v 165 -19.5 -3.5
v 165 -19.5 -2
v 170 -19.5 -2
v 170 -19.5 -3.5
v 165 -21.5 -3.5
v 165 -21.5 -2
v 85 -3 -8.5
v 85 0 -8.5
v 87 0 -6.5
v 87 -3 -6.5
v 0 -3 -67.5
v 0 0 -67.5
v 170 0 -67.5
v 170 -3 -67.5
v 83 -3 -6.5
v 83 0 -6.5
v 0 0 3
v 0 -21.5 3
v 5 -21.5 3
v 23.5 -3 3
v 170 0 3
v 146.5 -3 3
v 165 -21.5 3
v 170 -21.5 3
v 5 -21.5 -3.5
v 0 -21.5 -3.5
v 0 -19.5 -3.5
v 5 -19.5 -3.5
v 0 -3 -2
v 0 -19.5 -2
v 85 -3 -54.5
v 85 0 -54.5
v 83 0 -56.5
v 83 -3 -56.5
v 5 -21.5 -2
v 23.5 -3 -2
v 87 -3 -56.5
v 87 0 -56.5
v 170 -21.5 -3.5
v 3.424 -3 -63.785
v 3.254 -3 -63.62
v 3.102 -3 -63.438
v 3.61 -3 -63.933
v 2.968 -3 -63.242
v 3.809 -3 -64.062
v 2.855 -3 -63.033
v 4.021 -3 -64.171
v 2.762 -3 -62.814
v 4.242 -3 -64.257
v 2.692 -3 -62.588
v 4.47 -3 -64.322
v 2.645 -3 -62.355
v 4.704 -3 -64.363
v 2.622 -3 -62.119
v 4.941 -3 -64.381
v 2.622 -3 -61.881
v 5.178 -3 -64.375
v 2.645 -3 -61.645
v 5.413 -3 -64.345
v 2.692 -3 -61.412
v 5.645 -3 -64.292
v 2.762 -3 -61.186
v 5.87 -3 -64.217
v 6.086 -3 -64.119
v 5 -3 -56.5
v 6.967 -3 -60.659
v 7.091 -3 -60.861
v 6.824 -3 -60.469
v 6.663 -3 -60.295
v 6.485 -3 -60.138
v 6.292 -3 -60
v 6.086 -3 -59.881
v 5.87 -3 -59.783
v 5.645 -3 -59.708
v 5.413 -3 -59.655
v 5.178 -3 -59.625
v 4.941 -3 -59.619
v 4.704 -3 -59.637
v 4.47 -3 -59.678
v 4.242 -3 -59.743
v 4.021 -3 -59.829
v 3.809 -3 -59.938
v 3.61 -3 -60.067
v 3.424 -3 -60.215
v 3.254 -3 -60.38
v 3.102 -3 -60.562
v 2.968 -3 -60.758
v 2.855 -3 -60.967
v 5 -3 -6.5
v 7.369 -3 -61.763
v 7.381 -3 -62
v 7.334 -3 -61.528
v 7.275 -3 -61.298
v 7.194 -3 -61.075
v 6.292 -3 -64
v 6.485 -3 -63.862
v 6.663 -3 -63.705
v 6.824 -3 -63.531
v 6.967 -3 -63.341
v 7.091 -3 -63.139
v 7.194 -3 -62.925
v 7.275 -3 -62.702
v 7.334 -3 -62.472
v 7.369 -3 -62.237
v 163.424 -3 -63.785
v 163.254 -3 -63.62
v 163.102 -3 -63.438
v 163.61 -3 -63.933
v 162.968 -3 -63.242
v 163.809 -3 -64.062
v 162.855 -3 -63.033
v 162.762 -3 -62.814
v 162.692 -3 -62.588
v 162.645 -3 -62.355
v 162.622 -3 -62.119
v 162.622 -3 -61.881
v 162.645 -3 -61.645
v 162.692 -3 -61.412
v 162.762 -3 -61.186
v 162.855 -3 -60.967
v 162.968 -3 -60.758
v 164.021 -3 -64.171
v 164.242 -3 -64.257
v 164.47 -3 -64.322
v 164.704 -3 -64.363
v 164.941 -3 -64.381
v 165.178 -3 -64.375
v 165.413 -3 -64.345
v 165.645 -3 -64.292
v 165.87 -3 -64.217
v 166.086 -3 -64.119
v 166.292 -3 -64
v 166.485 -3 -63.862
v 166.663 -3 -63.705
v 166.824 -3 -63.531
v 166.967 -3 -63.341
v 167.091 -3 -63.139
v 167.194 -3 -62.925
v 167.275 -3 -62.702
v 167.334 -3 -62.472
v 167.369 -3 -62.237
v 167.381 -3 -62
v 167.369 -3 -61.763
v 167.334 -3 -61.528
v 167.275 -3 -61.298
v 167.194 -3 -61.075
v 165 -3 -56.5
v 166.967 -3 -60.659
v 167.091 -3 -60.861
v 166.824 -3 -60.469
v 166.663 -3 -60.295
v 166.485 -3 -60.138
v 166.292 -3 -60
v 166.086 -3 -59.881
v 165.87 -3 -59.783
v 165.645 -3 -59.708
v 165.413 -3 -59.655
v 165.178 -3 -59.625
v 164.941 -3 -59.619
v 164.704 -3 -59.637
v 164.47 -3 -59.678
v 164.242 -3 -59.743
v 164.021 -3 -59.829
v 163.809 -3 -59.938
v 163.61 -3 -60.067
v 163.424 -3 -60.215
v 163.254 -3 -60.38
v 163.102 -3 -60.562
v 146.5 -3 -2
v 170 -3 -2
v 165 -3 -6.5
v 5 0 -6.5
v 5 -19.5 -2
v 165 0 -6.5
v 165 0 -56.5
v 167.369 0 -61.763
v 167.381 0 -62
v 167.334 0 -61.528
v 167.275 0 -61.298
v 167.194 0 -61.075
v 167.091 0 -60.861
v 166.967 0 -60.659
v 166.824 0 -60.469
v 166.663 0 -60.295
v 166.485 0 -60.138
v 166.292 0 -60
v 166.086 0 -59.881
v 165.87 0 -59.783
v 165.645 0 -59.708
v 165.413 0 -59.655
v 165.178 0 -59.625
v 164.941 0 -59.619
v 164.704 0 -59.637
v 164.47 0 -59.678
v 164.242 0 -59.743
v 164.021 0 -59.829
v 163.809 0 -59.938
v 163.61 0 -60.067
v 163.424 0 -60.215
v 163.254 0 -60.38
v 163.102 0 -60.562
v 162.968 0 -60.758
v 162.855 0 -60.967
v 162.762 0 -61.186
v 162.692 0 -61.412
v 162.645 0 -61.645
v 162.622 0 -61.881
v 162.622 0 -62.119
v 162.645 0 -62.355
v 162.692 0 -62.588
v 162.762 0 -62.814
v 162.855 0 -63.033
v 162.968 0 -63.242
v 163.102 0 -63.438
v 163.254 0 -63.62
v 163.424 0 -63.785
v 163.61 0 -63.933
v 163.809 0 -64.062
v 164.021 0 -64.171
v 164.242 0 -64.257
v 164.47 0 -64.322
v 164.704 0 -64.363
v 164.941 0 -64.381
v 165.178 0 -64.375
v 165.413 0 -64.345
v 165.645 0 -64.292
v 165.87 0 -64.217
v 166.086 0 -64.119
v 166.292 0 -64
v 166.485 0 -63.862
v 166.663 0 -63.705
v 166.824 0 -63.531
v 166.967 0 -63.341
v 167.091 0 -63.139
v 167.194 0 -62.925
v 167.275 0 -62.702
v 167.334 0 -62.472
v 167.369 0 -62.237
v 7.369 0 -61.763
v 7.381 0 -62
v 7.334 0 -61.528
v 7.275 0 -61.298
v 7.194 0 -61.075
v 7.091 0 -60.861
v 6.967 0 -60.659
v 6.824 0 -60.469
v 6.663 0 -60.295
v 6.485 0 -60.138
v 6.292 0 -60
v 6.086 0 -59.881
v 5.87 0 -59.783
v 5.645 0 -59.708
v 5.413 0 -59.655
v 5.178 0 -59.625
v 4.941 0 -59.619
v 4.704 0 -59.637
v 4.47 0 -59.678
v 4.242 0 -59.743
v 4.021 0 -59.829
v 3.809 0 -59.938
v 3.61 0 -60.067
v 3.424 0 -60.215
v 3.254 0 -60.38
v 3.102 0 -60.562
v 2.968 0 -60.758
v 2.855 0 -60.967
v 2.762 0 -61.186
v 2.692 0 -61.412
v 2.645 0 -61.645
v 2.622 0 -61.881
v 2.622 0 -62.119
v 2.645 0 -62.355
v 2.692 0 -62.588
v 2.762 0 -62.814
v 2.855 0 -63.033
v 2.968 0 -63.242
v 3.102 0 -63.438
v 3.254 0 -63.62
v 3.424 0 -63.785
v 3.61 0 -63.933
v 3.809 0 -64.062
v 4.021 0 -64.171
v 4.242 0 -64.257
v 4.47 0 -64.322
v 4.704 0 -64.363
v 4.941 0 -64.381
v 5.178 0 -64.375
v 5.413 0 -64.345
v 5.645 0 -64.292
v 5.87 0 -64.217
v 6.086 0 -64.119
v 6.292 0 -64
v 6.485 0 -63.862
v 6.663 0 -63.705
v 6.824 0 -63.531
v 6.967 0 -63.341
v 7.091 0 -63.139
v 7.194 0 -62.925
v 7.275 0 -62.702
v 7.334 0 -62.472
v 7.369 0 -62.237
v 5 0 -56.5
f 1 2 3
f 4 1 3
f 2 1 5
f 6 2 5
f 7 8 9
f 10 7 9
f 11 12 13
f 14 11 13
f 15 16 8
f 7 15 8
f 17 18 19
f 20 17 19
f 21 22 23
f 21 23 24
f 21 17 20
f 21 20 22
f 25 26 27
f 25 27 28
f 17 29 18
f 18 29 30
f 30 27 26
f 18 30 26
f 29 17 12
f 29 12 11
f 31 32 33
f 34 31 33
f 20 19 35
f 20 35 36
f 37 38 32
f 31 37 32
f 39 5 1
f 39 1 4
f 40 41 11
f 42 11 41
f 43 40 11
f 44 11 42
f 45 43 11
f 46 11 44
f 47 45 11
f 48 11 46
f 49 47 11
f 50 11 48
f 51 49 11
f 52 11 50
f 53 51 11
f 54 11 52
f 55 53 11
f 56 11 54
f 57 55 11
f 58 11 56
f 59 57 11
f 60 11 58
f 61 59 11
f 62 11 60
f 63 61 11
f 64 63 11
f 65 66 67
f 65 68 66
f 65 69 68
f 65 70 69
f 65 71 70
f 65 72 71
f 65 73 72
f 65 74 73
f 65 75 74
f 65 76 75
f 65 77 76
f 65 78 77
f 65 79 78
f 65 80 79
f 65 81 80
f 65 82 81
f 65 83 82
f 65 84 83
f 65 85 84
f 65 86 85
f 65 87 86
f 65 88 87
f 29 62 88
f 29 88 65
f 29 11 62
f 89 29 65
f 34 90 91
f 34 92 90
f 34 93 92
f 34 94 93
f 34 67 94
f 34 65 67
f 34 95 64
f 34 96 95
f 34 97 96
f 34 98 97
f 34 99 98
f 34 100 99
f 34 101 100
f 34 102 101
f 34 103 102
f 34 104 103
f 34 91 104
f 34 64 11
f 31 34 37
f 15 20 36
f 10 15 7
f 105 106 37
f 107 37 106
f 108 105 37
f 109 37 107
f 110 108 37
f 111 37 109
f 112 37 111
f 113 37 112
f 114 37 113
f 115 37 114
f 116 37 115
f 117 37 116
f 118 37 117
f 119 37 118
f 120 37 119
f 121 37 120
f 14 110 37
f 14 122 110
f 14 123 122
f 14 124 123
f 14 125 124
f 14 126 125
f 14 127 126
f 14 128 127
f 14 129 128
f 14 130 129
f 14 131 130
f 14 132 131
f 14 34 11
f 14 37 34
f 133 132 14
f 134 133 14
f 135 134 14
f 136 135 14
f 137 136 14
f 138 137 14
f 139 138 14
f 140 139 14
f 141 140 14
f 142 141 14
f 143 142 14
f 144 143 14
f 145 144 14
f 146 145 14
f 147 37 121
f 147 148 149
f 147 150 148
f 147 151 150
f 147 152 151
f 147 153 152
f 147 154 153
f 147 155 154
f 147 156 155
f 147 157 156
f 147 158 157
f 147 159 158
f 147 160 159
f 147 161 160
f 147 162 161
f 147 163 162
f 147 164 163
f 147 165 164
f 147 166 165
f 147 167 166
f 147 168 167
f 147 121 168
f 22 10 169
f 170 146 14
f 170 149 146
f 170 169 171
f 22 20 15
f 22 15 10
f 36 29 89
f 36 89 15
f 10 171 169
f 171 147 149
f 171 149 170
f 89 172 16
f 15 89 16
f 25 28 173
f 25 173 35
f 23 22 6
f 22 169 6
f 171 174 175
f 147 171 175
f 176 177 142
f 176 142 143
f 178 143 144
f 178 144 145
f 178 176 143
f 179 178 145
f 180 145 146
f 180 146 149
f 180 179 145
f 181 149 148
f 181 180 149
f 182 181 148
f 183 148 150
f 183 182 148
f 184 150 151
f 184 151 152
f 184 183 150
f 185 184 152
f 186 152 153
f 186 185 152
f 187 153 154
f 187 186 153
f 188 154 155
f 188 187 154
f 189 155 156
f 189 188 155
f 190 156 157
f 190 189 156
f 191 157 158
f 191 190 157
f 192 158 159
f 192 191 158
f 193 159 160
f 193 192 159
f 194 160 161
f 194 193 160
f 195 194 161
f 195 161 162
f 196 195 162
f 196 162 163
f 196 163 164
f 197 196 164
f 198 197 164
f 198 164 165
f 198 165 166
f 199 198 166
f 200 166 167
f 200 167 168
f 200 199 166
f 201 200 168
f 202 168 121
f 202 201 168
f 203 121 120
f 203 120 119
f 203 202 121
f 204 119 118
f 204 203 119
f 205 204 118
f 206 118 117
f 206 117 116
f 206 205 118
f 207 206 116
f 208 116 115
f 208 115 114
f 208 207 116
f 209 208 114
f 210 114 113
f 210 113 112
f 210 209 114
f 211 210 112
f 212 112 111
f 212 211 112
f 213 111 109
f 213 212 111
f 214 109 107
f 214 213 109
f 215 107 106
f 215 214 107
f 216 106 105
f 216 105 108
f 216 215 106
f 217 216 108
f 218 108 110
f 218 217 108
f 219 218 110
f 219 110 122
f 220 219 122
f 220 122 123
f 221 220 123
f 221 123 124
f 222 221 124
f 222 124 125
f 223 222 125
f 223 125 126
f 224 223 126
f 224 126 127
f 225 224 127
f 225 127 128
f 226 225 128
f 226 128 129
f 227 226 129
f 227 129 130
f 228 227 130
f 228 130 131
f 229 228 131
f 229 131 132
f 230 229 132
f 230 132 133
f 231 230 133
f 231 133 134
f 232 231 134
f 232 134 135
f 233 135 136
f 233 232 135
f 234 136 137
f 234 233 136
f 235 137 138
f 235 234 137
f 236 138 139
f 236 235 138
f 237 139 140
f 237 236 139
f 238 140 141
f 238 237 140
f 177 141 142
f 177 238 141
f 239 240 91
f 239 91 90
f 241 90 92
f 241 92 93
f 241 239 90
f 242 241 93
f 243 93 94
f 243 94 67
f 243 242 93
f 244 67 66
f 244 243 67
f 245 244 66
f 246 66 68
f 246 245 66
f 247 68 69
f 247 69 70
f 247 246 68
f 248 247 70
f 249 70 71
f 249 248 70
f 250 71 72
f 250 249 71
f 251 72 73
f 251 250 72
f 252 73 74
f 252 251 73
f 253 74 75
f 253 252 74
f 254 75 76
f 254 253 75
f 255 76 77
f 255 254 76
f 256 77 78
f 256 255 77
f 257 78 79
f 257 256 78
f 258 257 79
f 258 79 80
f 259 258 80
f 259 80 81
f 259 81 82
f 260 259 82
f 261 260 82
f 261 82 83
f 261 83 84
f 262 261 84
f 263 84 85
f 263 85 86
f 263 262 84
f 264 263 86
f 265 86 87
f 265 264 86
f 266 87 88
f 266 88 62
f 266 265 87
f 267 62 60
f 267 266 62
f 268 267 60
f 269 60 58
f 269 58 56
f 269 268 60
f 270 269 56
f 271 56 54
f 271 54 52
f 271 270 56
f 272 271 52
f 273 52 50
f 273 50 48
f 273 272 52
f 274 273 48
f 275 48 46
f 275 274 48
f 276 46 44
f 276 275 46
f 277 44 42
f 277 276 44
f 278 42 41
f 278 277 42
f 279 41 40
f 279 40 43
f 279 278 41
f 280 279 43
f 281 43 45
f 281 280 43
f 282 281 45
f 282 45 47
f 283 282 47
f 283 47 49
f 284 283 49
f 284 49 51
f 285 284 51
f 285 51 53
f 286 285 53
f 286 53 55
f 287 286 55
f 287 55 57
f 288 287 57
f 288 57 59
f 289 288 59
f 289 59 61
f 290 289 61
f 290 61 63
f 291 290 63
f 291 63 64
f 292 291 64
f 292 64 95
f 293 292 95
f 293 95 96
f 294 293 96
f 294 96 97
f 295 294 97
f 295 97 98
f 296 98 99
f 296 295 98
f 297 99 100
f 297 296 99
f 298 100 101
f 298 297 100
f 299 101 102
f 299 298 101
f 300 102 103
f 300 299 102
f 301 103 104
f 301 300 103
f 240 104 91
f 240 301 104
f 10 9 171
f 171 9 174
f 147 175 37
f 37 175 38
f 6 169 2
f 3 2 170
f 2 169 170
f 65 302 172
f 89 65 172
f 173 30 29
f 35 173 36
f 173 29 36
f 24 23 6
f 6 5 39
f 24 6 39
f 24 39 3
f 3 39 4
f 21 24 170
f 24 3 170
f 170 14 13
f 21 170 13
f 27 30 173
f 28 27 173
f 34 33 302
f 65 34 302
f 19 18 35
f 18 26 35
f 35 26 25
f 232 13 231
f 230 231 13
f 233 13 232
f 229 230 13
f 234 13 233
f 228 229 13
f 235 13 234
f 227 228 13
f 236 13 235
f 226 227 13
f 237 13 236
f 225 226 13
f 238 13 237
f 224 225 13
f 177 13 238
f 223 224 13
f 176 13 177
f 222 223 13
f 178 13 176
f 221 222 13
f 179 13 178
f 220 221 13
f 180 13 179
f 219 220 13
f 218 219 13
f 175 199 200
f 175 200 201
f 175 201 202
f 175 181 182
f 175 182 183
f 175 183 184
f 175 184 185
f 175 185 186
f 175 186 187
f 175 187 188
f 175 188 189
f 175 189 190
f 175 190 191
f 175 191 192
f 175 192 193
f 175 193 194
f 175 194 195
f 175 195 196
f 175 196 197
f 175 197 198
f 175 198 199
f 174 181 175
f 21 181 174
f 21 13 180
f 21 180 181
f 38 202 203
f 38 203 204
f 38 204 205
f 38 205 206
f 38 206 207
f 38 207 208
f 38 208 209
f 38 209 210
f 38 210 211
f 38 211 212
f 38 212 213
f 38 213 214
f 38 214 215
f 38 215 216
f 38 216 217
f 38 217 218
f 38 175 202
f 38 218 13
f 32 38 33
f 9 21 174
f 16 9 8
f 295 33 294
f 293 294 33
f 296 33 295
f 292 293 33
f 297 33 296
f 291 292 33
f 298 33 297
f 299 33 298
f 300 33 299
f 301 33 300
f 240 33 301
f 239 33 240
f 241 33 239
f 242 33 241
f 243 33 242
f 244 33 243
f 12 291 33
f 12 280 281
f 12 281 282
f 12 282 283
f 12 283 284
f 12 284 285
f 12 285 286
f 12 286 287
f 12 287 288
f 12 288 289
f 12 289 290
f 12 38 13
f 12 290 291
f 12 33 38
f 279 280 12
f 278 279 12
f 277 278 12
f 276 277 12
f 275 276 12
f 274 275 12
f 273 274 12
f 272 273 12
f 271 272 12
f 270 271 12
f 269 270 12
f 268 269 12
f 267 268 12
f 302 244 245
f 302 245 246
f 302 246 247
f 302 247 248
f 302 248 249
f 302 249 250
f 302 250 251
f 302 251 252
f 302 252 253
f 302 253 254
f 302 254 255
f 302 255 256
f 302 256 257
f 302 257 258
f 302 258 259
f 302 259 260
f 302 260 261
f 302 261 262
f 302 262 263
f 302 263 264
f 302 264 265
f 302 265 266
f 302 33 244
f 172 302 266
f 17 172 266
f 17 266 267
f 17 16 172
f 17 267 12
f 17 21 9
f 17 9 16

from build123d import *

# Parameters (mm, degrees)
F0_W          = 170
F0_H          = 66
F0_R          = 2.38125
F1_DEPTH      = 3
F0_H_2        = 1.5
F2_DEPTH      = 21.5
F3_W          = 170
F3_H          = 2
F4_DEPTH      = 2
F5_W          = 160
F5_H          = 18.5
F6_DEPTH      = 3.501
F8_DEPTH      = 3
F8_DEPTH_BACK = 2


with BuildPart() as f1:
    # F0 (on Front) → F1 (new body)
    with BuildSketch(Plane.XZ):
        with Locations((85, -34.5)):
            Rectangle(F0_W, F0_H)
        with Locations((5, -62)):
            Circle(F0_R, mode=Mode.SUBTRACT)
        with Locations((165, -62)):
            Circle(F0_R, mode=Mode.SUBTRACT)
        Polygon((5, -56.5), (5, -6.5), (83, -6.5), (85, -8.5), (87, -6.5), (165, -6.5), (165, -56.5), (87, -56.5), (85, -54.5), (83, -56.5), align=None, mode=Mode.SUBTRACT)
    extrude(amount=F1_DEPTH)

    # F0 (on Front) → F2 (join)
    with BuildSketch(Plane.XZ):
        with Locations((85, -0.75)):
            Rectangle(F0_W, F0_H_2)
    extrude(amount=F2_DEPTH)

    # F3 (on face) → F4 (join)
    with BuildSketch(Plane(origin=(0, 0, -1.5), x_dir=(1, 0, 0), z_dir=(0, 0, -1))):
        with Locations((85, 20.5)):
            Rectangle(F3_W, F3_H)
    extrude(amount=F4_DEPTH)

    # F5 (on face) → F6 (cut, through all)
    with BuildSketch(Plane(origin=(0, 0, -3.5), x_dir=(1, 0, 0), z_dir=(0, 0, -1))):
        with Locations((85, 12.25)):
            Rectangle(F5_W, F5_H)
    extrude(amount=-F6_DEPTH, mode=Mode.SUBTRACT)

    # F7 (on face) → F8 (join, two sides)
    with BuildSketch(Plane.XY) as f8_sk:
        Polygon((0, 0), (0, -21.5), (5, -21.5), (23.5, -3), (146.5, -3), (165, -21.5), (170, -21.5), (170, 0), align=None)
    extrude(amount=F8_DEPTH)
    extrude(f8_sk.sketch, amount=-F8_DEPTH_BACK)


solid = f1.part
